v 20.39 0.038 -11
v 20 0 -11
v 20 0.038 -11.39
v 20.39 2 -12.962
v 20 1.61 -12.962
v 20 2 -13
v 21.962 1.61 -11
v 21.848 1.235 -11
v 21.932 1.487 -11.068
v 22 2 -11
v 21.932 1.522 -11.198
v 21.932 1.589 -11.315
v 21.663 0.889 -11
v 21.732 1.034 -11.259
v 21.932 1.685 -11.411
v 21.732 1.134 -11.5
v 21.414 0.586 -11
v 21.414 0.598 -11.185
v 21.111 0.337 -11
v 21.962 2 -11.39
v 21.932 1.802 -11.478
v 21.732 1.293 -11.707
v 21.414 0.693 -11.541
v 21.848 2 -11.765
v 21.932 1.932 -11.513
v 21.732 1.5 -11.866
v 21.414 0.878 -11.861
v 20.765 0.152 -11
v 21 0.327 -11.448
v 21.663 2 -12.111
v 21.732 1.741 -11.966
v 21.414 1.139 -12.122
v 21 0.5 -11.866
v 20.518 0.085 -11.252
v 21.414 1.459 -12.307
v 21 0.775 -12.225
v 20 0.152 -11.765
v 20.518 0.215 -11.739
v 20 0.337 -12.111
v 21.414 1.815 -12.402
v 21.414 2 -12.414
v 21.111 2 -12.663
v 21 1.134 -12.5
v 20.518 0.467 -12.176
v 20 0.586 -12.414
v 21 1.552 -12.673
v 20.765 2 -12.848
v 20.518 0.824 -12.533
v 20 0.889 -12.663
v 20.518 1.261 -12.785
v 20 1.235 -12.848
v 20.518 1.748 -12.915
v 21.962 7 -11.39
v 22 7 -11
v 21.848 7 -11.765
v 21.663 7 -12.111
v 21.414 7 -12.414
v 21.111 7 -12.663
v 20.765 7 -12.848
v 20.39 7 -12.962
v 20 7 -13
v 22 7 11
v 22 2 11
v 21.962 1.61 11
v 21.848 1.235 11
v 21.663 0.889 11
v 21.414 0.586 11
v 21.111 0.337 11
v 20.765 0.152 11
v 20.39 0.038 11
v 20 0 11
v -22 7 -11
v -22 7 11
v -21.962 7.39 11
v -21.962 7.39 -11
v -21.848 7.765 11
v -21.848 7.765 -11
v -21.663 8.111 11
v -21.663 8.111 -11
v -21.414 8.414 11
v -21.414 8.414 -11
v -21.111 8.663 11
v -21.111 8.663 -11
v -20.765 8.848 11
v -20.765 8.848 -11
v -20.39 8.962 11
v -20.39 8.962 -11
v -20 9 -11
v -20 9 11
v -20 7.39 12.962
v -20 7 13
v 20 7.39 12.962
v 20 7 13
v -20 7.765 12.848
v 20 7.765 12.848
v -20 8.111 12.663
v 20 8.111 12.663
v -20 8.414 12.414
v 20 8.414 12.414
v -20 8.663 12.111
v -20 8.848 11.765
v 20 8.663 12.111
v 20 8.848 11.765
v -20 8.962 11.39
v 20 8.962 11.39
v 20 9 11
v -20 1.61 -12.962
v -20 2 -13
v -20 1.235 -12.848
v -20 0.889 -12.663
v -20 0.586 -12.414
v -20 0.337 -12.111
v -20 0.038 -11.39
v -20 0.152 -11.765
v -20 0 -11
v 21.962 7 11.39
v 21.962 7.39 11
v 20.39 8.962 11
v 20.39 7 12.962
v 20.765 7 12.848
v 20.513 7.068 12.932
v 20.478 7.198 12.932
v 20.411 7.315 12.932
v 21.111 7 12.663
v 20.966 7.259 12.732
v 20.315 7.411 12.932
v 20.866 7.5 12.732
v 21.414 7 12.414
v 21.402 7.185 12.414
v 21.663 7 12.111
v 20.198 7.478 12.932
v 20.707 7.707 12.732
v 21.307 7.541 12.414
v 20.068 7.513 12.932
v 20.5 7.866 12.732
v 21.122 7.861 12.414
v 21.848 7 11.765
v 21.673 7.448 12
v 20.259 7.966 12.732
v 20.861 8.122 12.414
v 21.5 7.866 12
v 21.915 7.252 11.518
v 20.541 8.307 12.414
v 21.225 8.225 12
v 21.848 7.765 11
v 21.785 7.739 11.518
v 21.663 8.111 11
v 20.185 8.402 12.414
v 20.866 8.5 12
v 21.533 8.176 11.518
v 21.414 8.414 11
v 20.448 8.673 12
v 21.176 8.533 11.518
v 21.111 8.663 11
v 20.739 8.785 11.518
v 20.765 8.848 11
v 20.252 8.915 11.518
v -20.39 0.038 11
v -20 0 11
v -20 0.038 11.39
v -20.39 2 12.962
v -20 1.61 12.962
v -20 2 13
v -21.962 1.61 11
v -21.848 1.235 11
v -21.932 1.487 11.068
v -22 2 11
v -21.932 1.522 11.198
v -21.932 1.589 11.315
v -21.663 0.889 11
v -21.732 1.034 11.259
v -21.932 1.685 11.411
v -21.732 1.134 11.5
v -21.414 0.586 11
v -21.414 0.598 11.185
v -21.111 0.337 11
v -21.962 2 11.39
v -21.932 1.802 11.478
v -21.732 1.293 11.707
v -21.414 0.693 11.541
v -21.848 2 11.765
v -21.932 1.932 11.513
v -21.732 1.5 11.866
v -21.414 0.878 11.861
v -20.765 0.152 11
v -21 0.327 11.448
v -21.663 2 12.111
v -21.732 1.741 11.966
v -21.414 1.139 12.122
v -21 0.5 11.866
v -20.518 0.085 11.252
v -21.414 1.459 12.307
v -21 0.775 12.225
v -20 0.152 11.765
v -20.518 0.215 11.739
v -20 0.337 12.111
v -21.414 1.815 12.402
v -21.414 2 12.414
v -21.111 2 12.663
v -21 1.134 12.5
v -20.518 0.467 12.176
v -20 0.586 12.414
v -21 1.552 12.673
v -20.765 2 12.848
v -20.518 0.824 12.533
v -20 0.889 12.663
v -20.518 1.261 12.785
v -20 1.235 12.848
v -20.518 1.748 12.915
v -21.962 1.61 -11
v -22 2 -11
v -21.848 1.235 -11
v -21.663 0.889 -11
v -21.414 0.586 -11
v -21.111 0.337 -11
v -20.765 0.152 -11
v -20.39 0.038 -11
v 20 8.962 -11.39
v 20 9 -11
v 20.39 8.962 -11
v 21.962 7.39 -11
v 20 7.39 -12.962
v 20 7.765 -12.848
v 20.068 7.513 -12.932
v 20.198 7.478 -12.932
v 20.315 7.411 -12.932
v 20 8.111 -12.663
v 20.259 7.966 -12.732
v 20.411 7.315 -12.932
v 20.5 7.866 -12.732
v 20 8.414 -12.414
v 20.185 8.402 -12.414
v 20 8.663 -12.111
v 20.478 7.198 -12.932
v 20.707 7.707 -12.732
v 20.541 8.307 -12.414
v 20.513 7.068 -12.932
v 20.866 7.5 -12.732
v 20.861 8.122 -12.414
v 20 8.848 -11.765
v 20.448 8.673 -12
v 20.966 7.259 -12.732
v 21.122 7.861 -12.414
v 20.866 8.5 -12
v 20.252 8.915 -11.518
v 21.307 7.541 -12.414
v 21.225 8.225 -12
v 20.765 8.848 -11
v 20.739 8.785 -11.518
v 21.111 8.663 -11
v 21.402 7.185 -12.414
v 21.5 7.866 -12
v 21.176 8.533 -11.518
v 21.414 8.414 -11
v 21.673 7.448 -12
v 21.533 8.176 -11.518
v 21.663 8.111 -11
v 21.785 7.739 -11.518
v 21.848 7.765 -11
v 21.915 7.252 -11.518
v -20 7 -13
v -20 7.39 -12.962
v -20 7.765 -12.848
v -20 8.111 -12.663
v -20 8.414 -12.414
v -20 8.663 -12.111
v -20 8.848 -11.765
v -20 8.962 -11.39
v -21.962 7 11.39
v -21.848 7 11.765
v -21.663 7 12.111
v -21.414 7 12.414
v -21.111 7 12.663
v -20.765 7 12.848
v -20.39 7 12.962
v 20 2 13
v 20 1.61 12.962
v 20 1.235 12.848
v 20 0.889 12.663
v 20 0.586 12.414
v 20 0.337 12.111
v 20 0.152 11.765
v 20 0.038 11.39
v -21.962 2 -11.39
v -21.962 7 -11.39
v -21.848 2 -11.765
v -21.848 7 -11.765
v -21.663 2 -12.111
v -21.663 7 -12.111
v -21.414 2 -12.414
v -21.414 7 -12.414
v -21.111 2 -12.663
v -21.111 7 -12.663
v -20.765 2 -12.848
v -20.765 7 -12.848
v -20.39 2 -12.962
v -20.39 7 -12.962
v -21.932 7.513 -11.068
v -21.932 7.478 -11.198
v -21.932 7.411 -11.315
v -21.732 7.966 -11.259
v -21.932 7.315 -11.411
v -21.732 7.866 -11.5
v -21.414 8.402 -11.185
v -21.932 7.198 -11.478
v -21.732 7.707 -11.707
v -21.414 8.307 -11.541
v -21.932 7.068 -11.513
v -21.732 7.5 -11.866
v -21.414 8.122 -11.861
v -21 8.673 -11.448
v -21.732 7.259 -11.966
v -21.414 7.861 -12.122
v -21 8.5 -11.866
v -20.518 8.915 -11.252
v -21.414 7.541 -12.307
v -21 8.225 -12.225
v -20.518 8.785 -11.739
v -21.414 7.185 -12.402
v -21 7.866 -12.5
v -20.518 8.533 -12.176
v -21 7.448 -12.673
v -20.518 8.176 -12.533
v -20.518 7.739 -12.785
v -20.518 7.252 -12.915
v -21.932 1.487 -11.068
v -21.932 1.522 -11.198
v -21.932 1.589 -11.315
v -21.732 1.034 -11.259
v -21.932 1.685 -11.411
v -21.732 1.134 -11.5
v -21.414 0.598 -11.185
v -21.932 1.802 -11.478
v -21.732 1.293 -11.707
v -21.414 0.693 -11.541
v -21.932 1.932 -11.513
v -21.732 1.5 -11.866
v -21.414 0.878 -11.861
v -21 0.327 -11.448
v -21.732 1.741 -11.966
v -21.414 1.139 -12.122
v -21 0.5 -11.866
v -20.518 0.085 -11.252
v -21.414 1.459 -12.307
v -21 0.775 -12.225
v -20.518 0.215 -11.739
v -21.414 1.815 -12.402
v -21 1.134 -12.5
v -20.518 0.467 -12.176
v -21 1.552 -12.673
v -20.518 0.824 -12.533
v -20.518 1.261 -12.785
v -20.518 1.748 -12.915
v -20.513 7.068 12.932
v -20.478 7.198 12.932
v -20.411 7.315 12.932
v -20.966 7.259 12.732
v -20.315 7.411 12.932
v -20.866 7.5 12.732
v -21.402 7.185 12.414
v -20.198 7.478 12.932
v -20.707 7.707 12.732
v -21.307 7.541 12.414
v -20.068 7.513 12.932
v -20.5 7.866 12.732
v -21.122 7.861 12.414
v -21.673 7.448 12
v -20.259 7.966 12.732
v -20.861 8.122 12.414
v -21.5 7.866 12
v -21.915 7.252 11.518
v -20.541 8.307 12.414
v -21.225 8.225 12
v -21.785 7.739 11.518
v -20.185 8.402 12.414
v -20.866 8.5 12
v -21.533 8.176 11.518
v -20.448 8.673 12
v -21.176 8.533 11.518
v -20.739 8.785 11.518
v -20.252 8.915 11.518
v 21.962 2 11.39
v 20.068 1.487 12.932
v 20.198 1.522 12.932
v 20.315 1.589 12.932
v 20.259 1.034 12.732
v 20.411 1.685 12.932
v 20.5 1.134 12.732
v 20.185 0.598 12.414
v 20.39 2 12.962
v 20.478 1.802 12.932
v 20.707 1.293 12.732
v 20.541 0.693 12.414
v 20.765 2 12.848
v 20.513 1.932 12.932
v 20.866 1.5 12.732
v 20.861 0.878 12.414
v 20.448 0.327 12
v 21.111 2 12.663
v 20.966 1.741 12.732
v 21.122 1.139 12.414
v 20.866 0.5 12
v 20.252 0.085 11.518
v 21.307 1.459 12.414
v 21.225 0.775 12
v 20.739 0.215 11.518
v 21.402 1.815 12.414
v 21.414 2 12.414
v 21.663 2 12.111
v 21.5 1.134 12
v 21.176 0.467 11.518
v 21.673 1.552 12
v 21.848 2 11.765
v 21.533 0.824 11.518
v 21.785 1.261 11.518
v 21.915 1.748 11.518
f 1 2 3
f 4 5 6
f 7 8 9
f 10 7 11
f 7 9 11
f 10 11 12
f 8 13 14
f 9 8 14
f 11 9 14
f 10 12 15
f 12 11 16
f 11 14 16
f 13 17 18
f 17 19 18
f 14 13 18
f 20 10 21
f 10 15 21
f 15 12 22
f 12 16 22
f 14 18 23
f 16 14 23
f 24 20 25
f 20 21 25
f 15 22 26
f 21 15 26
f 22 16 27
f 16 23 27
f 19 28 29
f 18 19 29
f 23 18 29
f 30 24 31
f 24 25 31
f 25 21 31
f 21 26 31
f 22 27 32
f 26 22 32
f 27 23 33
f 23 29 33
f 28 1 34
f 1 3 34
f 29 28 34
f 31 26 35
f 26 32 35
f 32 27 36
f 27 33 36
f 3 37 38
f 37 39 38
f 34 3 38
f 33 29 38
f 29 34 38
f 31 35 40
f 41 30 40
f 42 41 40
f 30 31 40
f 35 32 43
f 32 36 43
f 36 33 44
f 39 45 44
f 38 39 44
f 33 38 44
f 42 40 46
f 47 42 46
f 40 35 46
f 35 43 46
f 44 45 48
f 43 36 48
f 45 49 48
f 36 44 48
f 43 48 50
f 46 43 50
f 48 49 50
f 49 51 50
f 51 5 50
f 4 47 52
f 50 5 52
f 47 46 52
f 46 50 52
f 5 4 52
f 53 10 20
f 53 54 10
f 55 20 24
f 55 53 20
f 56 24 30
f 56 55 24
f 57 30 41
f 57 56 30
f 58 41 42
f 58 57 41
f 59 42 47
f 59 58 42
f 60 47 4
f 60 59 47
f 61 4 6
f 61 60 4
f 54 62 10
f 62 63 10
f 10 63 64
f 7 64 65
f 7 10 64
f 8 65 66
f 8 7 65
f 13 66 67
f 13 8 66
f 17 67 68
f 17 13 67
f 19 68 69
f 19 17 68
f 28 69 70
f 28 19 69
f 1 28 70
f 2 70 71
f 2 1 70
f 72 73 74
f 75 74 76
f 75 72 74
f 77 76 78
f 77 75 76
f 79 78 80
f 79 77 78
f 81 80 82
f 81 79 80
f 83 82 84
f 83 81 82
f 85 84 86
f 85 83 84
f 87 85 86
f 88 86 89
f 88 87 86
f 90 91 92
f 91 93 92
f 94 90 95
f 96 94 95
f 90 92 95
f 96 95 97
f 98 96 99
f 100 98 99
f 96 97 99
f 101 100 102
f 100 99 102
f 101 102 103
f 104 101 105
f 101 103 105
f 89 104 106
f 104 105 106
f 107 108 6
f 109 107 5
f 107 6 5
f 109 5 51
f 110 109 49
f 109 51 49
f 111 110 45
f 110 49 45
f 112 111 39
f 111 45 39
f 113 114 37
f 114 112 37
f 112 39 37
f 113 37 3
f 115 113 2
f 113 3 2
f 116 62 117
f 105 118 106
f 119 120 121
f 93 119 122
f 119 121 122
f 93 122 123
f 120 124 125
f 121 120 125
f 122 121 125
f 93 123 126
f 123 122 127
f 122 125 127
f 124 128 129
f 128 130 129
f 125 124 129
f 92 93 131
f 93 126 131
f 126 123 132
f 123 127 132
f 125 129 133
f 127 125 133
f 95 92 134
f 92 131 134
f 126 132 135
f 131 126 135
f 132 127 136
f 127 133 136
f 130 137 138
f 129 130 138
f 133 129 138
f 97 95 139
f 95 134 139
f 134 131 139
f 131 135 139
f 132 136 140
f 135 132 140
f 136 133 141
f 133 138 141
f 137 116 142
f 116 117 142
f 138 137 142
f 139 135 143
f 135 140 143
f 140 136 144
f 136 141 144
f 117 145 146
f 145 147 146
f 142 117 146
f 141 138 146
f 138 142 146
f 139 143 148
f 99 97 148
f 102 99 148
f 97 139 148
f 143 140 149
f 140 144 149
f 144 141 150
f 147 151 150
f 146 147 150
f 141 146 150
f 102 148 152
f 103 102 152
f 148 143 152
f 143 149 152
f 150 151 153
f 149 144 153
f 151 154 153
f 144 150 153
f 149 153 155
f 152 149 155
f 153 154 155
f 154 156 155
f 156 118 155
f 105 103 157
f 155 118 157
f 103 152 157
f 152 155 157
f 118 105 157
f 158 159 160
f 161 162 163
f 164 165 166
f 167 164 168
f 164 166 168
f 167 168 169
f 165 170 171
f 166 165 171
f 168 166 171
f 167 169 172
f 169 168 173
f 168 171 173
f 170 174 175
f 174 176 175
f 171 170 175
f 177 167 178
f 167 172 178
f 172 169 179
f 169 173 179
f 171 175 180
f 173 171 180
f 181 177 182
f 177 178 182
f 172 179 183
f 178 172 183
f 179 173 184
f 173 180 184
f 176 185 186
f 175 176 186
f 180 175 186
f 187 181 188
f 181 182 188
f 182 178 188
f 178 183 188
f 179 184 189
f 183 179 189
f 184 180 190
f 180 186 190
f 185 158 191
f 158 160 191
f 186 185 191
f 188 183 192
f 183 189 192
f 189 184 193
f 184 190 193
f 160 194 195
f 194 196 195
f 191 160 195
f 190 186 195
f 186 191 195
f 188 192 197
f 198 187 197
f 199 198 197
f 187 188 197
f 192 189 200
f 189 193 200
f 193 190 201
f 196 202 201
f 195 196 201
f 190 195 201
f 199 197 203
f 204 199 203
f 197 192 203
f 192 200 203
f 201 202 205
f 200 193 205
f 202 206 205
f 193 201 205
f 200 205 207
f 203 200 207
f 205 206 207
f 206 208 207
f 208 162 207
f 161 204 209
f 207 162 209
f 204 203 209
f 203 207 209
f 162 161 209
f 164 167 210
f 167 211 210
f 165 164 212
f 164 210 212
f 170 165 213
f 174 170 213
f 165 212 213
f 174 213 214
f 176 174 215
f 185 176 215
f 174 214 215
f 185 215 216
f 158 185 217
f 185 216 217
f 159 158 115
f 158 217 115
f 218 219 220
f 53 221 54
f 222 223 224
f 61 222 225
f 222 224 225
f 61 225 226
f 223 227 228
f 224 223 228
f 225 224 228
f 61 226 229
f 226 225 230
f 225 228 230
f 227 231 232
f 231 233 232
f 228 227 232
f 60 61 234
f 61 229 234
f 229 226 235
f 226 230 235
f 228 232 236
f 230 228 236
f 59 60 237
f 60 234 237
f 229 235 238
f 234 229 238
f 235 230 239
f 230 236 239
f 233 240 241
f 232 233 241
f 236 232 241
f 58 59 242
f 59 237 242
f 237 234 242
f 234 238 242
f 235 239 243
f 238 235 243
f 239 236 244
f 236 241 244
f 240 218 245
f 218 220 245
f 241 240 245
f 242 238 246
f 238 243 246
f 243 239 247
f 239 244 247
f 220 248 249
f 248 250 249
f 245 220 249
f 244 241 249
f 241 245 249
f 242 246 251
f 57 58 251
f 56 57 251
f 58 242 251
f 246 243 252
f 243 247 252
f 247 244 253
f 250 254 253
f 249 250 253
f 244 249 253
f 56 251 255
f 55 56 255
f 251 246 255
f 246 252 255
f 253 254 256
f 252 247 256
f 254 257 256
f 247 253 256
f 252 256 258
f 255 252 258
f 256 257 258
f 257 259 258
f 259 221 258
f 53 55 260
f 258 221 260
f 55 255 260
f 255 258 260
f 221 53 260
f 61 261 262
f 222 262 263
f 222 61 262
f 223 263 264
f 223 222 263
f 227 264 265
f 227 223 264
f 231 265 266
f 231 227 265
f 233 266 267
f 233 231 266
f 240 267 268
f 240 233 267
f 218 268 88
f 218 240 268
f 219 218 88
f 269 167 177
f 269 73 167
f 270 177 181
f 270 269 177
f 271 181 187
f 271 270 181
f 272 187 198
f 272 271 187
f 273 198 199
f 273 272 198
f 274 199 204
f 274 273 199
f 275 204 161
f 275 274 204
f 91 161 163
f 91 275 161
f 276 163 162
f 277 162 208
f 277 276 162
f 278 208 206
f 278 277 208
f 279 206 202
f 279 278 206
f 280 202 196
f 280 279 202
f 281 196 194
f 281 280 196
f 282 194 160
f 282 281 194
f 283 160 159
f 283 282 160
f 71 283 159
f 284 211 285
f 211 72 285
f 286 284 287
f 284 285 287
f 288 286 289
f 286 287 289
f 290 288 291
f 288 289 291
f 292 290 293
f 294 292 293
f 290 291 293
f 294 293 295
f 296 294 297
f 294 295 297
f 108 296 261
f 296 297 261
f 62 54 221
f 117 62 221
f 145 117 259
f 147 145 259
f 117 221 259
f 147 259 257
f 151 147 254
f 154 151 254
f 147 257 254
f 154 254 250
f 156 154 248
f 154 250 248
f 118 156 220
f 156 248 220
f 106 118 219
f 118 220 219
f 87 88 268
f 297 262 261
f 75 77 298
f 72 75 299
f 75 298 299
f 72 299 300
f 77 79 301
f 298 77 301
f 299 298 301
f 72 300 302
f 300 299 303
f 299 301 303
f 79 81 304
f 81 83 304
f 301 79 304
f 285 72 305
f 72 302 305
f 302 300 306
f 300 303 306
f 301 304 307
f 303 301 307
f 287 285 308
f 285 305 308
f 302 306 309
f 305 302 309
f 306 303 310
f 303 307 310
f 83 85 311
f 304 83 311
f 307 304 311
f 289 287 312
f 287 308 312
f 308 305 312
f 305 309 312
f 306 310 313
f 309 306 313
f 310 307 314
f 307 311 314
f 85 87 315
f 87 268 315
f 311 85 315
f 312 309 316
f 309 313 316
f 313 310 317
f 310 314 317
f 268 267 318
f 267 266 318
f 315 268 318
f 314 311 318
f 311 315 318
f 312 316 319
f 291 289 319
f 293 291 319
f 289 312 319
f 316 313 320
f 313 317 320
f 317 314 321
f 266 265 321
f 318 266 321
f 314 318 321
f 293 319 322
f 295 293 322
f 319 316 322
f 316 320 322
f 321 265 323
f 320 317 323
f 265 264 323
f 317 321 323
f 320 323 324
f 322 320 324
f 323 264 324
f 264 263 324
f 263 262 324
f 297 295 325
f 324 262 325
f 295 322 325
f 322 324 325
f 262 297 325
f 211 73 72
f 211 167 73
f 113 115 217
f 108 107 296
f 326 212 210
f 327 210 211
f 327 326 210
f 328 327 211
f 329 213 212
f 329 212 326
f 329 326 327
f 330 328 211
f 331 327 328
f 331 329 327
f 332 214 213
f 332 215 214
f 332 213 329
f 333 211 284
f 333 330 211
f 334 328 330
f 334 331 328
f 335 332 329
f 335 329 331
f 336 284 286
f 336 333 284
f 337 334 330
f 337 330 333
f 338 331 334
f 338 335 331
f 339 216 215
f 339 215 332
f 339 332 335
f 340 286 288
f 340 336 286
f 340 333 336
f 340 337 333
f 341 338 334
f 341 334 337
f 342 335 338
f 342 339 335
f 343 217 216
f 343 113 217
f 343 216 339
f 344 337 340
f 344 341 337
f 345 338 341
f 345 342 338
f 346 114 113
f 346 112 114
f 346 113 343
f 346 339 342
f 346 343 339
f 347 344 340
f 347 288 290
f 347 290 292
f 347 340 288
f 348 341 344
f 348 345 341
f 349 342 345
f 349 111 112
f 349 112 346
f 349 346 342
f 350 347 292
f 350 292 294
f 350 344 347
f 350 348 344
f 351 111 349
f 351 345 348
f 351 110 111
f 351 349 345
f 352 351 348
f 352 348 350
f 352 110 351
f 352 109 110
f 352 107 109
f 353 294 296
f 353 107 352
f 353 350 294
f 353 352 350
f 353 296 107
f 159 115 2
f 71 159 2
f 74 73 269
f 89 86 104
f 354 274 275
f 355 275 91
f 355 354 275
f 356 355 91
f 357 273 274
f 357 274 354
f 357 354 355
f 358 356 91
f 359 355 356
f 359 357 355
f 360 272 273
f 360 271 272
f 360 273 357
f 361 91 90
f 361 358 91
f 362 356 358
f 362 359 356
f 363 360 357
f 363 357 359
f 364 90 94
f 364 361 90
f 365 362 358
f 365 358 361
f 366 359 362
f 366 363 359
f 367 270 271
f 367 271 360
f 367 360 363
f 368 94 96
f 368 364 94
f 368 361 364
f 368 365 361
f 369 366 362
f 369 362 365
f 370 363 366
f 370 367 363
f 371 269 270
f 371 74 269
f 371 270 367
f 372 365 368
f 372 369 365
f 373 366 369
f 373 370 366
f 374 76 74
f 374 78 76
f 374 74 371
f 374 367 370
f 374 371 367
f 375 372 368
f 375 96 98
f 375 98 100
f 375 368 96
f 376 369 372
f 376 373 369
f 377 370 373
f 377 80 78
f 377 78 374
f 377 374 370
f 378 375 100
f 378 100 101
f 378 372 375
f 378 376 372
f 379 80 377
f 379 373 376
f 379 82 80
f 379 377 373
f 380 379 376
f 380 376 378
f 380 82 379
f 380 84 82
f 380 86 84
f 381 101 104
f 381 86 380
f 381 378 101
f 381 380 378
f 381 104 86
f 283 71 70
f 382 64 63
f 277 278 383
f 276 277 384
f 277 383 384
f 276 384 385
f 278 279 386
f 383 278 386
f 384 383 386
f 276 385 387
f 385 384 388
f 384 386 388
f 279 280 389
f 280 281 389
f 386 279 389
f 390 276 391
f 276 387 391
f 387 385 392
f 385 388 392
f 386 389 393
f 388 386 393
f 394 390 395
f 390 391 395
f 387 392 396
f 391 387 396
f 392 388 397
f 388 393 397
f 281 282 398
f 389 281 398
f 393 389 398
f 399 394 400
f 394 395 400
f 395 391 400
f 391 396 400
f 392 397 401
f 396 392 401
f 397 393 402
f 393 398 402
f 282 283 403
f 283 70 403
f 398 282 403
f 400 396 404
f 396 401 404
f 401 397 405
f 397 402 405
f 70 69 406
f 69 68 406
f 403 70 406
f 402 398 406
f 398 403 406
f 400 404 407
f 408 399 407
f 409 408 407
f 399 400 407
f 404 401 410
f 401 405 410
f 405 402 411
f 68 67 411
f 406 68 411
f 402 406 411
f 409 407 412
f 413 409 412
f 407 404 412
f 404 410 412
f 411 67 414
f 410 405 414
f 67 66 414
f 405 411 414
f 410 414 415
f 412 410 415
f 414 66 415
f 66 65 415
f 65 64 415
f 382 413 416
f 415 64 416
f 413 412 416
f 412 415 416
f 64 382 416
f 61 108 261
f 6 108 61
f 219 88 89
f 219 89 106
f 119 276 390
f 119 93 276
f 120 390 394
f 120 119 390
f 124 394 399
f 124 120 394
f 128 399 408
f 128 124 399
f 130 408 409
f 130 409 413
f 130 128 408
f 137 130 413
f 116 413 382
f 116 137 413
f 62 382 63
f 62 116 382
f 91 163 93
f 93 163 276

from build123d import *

# Parameters (mm, degrees)
SCHIZZO1_W                   = 44
SCHIZZO1_H                   = 26
ESTRUSIONE_ESTRUSIONE1_DEPTH = 9
RACCORDO1_R                  = 2


with BuildPart() as part:
    # Schizzo1 → Estrusione-Estrusione1 (new body)
    with BuildSketch(Plane(origin=(0, 0, 0), x_dir=(1, 0, 0), z_dir=(0, 1, 0))):
        Rectangle(SCHIZZO1_W, SCHIZZO1_H)
    extrude(amount=ESTRUSIONE_ESTRUSIONE1_DEPTH)

    # Raccordo1
    raccordo1_edges = [part.edges().sort_by_distance(p)[0] for p in [
        (22, 9, 0),
        (0, 9, -13),
        (-22, 9, 0),
        (0, 0, -13),
        (22, 0, 0),
        (0, 0, 13),
        (-22, 0, 0),
        (-22, 4.5, -13),
        (22, 4.5, -13),
        (22, 4.5, 13),
        (-22, 4.5, 13),
        (0, 9, 13),
    ]]
    fillet(raccordo1_edges, radius=RACCORDO1_R)


solid = part.part
